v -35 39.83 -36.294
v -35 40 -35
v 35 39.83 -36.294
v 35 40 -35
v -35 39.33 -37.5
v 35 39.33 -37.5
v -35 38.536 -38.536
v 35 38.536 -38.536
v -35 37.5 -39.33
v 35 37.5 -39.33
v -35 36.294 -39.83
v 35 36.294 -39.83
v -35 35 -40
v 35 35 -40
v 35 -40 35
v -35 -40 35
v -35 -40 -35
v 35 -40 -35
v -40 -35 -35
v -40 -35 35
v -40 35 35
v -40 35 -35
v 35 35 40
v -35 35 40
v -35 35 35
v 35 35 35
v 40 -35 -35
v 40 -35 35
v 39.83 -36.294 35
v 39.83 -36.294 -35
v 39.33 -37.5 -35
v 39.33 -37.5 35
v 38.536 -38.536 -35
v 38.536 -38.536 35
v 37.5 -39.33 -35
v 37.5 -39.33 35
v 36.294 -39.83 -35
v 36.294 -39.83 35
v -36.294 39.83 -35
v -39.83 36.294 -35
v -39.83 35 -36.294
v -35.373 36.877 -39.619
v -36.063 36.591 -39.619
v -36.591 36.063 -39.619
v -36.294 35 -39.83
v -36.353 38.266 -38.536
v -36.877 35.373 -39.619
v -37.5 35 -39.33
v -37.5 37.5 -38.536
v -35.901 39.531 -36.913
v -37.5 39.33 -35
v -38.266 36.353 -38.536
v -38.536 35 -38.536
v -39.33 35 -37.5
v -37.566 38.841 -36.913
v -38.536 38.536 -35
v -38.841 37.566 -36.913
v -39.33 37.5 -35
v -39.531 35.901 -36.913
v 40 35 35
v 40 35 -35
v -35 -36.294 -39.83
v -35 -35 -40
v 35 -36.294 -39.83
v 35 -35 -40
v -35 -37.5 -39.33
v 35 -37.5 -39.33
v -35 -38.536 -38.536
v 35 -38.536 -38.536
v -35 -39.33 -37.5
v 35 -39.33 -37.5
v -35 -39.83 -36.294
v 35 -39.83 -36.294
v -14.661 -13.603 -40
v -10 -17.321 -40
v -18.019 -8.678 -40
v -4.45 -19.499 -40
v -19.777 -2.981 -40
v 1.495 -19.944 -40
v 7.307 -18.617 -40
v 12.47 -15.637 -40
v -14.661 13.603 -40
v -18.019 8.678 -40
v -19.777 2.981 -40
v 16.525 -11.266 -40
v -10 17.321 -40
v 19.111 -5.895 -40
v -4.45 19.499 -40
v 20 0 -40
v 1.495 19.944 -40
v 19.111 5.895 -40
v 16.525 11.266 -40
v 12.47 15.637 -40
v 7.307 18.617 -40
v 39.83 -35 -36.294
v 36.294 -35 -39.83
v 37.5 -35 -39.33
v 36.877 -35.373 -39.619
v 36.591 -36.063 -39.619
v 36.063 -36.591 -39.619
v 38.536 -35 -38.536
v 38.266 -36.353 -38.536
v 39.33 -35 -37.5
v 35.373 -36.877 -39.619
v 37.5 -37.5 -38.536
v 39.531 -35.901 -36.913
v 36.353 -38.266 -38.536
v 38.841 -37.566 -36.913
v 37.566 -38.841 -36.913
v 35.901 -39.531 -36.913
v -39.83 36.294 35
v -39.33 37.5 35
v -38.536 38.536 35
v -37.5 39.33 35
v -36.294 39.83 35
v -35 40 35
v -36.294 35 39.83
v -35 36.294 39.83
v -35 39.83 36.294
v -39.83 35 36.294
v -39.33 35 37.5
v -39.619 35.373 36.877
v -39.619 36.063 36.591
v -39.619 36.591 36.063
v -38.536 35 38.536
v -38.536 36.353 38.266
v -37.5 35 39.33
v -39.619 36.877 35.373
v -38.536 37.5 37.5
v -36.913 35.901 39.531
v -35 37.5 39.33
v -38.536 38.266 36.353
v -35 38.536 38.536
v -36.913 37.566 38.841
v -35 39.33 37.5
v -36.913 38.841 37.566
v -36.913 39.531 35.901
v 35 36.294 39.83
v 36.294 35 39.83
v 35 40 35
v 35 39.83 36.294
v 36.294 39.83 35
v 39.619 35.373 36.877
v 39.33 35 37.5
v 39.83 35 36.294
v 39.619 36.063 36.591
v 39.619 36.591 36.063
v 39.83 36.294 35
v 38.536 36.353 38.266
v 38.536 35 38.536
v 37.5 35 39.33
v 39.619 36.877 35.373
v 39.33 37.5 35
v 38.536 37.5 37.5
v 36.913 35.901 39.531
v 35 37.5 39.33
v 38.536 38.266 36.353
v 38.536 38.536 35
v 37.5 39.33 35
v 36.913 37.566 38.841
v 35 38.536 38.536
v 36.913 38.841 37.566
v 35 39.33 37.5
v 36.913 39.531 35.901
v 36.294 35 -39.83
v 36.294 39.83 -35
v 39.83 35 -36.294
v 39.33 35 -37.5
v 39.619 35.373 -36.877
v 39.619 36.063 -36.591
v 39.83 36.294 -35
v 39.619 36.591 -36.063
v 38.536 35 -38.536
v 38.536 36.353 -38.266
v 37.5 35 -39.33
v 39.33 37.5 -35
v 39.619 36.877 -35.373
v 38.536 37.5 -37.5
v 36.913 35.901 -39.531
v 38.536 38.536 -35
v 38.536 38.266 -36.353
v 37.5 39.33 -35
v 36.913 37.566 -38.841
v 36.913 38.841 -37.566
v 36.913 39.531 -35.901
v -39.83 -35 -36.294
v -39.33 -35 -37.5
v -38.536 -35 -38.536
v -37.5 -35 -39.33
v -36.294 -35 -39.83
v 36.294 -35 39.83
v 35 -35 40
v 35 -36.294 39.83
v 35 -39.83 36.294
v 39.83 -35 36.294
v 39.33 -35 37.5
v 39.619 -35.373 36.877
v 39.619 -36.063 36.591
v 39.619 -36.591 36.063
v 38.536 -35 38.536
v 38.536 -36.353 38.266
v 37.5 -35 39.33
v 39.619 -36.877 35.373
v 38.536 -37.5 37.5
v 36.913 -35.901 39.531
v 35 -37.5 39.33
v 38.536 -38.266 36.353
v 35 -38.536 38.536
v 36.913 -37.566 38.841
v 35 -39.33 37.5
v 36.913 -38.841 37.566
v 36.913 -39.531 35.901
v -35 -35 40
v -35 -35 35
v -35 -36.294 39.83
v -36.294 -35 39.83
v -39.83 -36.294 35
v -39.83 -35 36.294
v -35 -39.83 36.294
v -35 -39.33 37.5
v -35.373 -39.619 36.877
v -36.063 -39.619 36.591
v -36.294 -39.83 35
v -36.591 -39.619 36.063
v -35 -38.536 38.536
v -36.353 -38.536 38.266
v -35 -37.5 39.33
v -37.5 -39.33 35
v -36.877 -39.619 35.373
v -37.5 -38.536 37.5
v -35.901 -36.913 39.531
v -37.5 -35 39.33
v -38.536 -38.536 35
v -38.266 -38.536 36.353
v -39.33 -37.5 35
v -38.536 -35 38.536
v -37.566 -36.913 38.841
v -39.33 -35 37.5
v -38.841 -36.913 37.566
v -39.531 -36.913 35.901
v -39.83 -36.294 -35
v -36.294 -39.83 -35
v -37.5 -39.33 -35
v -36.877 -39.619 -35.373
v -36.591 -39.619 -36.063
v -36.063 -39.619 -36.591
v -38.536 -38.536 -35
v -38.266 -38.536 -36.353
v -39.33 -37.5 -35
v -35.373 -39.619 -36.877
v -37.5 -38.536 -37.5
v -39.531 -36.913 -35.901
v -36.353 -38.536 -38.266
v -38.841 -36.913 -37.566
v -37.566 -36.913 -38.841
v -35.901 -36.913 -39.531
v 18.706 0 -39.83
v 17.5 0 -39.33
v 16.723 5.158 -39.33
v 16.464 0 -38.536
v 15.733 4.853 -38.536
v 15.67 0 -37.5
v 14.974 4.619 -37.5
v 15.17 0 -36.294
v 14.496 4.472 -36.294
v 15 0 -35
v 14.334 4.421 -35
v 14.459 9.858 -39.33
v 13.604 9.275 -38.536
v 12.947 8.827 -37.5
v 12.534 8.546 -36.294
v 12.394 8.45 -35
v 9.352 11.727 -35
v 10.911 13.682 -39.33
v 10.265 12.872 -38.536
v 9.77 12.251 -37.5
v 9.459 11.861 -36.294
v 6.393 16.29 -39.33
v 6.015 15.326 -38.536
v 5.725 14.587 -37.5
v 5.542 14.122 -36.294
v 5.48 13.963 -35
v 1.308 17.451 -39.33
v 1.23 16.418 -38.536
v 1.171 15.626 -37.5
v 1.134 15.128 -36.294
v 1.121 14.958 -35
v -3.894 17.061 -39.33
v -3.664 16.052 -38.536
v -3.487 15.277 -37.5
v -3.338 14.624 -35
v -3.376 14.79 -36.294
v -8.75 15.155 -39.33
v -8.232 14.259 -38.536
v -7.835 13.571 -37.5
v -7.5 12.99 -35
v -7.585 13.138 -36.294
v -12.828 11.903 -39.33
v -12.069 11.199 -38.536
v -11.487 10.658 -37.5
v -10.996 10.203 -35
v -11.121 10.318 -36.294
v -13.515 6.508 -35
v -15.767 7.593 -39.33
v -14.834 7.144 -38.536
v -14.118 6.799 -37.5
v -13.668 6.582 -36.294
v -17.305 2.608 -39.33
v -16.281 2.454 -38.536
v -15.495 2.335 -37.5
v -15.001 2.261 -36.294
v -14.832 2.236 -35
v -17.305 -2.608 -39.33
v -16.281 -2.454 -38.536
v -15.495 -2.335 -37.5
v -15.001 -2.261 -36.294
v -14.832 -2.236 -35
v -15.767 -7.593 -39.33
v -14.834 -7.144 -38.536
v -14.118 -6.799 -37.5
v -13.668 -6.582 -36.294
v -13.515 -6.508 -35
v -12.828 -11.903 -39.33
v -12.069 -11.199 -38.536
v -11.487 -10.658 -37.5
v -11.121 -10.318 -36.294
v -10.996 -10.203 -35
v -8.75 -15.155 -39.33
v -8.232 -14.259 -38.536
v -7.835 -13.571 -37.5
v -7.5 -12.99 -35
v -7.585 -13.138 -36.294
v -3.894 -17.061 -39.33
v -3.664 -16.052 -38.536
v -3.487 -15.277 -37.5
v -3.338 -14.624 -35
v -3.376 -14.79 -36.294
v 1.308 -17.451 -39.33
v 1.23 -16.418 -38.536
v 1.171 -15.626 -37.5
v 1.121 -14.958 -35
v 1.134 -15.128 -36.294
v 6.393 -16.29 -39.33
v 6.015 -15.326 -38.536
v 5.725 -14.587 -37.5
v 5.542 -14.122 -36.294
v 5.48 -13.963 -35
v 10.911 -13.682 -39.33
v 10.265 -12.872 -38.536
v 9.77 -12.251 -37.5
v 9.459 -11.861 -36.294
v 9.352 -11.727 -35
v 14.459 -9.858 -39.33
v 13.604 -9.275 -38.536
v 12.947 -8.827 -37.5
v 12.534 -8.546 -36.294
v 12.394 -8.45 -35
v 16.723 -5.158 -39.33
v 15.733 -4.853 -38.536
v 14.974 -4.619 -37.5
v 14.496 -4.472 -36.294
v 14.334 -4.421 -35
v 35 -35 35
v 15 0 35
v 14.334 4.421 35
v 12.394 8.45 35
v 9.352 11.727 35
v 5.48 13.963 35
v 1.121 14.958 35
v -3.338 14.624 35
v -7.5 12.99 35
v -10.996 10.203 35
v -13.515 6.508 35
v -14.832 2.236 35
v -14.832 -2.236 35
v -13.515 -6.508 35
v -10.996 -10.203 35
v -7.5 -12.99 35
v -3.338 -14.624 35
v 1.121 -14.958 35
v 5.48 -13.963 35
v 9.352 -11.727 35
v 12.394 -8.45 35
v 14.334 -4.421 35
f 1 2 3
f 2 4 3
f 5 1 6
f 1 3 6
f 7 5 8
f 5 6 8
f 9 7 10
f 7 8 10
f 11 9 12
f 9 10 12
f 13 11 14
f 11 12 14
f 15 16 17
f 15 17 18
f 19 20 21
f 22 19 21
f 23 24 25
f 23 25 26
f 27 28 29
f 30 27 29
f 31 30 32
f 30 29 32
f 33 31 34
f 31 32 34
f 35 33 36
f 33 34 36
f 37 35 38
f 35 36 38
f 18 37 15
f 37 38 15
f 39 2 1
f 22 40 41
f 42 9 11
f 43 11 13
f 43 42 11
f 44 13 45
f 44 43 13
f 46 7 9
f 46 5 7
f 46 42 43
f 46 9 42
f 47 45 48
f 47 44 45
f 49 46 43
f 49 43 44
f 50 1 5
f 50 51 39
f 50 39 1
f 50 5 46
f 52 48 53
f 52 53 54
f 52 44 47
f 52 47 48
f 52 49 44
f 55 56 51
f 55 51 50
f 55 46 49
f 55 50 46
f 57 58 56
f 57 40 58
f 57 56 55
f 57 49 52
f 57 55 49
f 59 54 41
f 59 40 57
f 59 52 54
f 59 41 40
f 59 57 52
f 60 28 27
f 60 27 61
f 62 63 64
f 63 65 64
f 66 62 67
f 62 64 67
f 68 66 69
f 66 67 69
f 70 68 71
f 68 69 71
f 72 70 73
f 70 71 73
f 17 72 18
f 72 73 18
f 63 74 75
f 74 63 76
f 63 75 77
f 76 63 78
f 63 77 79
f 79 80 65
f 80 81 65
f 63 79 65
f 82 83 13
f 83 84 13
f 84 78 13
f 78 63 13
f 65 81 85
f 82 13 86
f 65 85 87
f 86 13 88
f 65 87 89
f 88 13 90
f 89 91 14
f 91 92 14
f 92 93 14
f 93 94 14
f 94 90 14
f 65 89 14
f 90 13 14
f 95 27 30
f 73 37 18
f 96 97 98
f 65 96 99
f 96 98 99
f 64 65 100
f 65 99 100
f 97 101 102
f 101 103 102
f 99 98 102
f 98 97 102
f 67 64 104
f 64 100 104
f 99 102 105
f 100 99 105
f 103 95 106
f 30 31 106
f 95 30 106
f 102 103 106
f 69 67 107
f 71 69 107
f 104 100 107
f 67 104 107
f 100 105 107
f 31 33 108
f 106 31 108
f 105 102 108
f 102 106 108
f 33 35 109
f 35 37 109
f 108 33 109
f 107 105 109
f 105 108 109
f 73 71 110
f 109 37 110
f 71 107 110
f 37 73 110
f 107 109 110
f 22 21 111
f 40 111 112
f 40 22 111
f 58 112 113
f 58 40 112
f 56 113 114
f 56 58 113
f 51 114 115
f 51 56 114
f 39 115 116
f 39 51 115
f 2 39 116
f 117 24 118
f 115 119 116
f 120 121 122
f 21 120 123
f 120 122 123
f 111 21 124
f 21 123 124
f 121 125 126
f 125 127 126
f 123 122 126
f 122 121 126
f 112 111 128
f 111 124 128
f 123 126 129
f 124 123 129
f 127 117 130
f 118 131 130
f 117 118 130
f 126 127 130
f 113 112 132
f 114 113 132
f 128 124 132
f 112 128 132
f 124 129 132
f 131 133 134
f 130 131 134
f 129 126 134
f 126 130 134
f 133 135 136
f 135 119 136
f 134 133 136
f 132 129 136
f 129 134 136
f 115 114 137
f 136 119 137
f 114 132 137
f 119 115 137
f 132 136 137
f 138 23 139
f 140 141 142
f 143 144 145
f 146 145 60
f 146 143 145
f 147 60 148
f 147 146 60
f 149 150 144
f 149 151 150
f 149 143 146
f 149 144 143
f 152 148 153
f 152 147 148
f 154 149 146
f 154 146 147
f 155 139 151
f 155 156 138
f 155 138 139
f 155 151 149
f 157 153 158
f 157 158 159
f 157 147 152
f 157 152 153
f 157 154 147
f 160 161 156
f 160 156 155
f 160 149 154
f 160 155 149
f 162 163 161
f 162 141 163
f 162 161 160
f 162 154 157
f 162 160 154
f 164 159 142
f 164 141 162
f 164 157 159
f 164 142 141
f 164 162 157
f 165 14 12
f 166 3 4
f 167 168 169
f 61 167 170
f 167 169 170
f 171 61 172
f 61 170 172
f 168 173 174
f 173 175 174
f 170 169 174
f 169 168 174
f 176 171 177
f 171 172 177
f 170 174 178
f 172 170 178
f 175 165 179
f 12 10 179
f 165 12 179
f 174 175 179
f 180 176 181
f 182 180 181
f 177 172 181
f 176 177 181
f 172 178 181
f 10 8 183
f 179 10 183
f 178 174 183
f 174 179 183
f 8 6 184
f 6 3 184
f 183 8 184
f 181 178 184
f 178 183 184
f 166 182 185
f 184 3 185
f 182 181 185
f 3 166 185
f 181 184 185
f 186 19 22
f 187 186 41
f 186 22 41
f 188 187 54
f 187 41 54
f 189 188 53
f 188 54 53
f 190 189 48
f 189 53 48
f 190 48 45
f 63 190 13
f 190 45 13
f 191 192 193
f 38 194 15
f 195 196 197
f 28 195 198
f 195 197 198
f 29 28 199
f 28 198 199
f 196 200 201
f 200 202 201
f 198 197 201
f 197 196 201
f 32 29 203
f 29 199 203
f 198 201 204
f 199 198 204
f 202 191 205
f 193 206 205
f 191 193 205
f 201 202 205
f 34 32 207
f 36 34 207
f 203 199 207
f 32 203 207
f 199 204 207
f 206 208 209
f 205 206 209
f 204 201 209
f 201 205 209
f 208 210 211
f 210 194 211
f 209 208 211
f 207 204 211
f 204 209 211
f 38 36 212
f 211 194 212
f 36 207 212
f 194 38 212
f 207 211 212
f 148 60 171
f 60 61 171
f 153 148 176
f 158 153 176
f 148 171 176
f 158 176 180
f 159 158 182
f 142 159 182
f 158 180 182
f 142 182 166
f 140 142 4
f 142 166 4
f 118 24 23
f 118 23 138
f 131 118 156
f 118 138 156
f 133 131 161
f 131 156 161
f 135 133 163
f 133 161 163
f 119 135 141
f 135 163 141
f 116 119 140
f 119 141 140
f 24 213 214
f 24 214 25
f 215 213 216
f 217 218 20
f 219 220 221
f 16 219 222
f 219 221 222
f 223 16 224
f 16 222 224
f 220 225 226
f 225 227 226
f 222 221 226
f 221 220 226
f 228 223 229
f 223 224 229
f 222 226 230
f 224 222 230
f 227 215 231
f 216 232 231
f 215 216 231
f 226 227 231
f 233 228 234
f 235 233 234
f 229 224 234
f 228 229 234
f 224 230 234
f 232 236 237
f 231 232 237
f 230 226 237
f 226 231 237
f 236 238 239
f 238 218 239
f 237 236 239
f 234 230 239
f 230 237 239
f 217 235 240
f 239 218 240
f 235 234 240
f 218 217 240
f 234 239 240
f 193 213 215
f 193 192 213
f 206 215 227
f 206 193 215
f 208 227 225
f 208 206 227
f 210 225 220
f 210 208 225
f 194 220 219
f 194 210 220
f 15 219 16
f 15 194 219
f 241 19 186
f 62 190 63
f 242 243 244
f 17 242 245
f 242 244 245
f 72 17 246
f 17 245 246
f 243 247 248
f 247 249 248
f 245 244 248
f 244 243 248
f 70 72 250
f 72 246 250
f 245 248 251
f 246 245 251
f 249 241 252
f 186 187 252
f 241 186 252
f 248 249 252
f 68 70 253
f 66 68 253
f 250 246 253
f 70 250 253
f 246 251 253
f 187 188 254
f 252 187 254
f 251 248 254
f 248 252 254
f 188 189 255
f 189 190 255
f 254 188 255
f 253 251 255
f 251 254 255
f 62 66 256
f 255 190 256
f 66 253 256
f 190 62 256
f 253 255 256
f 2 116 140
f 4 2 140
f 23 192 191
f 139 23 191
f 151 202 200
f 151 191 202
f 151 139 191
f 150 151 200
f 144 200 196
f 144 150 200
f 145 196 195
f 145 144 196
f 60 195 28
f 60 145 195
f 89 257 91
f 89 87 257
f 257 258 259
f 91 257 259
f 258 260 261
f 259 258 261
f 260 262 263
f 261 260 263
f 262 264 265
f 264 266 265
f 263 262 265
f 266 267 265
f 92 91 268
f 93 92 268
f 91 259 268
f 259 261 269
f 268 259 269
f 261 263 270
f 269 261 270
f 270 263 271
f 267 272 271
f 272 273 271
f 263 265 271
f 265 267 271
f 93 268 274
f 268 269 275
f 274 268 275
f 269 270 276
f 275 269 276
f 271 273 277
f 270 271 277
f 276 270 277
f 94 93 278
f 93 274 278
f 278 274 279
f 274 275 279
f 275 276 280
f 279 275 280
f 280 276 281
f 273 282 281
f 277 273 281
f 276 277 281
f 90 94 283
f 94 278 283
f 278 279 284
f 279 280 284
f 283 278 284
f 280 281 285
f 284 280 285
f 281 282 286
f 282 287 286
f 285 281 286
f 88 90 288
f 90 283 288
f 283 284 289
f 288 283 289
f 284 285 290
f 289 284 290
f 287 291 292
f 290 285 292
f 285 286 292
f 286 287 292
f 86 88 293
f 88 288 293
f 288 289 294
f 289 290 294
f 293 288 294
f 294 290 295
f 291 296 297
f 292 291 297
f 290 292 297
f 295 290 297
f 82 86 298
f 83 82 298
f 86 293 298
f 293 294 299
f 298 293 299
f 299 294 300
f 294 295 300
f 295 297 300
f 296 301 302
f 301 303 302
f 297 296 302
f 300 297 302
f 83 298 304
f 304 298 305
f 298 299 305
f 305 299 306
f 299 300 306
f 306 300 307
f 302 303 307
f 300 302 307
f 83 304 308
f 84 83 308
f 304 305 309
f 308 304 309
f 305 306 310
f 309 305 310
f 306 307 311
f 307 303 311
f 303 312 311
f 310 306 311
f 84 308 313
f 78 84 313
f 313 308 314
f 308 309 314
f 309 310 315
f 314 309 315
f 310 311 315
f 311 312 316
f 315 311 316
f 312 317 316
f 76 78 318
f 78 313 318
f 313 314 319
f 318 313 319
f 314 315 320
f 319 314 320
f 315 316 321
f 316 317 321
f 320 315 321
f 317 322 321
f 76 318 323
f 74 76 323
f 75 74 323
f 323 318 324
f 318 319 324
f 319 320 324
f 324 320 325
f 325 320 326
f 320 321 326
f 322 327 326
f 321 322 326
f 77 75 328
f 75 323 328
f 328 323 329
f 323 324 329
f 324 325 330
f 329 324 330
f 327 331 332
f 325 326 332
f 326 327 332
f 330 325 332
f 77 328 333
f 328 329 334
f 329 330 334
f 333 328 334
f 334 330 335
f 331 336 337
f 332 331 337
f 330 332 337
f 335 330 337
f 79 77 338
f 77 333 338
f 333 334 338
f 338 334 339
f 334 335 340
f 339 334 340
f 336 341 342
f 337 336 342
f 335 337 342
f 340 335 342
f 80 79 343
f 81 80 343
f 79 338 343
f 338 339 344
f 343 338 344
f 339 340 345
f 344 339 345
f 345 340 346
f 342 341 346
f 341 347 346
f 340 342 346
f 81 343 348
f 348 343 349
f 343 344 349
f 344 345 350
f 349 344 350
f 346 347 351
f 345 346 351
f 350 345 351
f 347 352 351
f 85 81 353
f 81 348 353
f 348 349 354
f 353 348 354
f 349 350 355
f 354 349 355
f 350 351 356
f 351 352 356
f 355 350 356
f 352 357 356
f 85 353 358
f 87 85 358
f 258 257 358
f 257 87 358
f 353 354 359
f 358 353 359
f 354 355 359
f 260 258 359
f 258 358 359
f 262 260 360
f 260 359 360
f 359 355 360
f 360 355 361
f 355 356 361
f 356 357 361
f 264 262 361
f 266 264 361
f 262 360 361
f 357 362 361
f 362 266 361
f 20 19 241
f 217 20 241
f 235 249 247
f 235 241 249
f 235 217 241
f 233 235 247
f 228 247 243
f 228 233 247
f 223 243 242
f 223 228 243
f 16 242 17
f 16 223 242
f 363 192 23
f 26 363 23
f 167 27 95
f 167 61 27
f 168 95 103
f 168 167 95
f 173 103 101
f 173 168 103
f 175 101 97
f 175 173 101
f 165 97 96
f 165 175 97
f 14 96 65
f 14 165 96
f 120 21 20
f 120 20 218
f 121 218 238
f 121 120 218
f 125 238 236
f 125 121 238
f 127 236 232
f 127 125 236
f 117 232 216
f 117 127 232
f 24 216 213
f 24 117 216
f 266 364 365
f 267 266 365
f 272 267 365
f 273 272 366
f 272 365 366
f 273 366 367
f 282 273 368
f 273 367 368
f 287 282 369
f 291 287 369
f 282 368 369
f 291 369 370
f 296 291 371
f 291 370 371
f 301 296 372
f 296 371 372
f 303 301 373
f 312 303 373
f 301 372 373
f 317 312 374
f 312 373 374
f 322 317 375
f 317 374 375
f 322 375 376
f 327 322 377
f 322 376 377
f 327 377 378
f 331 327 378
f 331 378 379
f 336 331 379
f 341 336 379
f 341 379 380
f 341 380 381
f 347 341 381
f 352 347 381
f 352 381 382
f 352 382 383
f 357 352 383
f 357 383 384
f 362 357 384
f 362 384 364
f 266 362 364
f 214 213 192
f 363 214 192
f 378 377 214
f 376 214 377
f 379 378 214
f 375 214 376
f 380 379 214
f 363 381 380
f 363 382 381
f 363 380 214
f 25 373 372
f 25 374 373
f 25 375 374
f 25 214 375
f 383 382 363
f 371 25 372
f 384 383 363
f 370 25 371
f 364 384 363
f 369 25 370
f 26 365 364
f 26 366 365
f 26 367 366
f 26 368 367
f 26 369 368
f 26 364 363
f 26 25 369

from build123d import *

# Parameters (mm, degrees)
F0_W     = 80
F0_H     = 80
F1_DEPTH = 40
F2_R     = 5
F3_R     = 15
F4_DEPTH = 80.001
F5_R     = 5
F6_DEPTH = 5


with BuildPart() as f1:
    # F0 (on Top) → F1 (new body, symmetric)
    with BuildSketch(Plane.XY):
        Rectangle(F0_W, F0_H)
    extrude(amount=F1_DEPTH, both=True)

    # F2
    f2_edges = [f1.edges().sort_by_distance(p)[0] for p in [
        (0, 40, 40),
        (-40, 0, 40),
        (0, -40, 40),
        (40, 0, 40),
        (-40, 40, 0),
        (0, 40, -40),
        (-40, 0, -40),
        (-40, -40, 0),
        (40, -40, 0),
        (40, 0, -40),
        (40, 40, 0),
        (0, -40, -40),
    ]]
    fillet(f2_edges, radius=F2_R)

    # F3 (on face) → F4 (cut, through all)
    with BuildSketch(Plane.XY.offset(40)):
        Circle(F3_R)
    extrude(amount=-F4_DEPTH, mode=Mode.SUBTRACT)

    # F5
    f5_edges = [f1.edges().sort_by_distance(p)[0] for p in [
        (-15, 0, -40),
    ]]
    fillet(f5_edges, radius=F5_R)

    # F6 (cut): a face of the model
    f6_faces = [f1.faces().sort_by_distance(p)[0] for p in [
        (0, 34.0100505063, 40),
    ]]
    extrude(f6_faces, amount=-F6_DEPTH, mode=Mode.SUBTRACT)


solid = f1.part
